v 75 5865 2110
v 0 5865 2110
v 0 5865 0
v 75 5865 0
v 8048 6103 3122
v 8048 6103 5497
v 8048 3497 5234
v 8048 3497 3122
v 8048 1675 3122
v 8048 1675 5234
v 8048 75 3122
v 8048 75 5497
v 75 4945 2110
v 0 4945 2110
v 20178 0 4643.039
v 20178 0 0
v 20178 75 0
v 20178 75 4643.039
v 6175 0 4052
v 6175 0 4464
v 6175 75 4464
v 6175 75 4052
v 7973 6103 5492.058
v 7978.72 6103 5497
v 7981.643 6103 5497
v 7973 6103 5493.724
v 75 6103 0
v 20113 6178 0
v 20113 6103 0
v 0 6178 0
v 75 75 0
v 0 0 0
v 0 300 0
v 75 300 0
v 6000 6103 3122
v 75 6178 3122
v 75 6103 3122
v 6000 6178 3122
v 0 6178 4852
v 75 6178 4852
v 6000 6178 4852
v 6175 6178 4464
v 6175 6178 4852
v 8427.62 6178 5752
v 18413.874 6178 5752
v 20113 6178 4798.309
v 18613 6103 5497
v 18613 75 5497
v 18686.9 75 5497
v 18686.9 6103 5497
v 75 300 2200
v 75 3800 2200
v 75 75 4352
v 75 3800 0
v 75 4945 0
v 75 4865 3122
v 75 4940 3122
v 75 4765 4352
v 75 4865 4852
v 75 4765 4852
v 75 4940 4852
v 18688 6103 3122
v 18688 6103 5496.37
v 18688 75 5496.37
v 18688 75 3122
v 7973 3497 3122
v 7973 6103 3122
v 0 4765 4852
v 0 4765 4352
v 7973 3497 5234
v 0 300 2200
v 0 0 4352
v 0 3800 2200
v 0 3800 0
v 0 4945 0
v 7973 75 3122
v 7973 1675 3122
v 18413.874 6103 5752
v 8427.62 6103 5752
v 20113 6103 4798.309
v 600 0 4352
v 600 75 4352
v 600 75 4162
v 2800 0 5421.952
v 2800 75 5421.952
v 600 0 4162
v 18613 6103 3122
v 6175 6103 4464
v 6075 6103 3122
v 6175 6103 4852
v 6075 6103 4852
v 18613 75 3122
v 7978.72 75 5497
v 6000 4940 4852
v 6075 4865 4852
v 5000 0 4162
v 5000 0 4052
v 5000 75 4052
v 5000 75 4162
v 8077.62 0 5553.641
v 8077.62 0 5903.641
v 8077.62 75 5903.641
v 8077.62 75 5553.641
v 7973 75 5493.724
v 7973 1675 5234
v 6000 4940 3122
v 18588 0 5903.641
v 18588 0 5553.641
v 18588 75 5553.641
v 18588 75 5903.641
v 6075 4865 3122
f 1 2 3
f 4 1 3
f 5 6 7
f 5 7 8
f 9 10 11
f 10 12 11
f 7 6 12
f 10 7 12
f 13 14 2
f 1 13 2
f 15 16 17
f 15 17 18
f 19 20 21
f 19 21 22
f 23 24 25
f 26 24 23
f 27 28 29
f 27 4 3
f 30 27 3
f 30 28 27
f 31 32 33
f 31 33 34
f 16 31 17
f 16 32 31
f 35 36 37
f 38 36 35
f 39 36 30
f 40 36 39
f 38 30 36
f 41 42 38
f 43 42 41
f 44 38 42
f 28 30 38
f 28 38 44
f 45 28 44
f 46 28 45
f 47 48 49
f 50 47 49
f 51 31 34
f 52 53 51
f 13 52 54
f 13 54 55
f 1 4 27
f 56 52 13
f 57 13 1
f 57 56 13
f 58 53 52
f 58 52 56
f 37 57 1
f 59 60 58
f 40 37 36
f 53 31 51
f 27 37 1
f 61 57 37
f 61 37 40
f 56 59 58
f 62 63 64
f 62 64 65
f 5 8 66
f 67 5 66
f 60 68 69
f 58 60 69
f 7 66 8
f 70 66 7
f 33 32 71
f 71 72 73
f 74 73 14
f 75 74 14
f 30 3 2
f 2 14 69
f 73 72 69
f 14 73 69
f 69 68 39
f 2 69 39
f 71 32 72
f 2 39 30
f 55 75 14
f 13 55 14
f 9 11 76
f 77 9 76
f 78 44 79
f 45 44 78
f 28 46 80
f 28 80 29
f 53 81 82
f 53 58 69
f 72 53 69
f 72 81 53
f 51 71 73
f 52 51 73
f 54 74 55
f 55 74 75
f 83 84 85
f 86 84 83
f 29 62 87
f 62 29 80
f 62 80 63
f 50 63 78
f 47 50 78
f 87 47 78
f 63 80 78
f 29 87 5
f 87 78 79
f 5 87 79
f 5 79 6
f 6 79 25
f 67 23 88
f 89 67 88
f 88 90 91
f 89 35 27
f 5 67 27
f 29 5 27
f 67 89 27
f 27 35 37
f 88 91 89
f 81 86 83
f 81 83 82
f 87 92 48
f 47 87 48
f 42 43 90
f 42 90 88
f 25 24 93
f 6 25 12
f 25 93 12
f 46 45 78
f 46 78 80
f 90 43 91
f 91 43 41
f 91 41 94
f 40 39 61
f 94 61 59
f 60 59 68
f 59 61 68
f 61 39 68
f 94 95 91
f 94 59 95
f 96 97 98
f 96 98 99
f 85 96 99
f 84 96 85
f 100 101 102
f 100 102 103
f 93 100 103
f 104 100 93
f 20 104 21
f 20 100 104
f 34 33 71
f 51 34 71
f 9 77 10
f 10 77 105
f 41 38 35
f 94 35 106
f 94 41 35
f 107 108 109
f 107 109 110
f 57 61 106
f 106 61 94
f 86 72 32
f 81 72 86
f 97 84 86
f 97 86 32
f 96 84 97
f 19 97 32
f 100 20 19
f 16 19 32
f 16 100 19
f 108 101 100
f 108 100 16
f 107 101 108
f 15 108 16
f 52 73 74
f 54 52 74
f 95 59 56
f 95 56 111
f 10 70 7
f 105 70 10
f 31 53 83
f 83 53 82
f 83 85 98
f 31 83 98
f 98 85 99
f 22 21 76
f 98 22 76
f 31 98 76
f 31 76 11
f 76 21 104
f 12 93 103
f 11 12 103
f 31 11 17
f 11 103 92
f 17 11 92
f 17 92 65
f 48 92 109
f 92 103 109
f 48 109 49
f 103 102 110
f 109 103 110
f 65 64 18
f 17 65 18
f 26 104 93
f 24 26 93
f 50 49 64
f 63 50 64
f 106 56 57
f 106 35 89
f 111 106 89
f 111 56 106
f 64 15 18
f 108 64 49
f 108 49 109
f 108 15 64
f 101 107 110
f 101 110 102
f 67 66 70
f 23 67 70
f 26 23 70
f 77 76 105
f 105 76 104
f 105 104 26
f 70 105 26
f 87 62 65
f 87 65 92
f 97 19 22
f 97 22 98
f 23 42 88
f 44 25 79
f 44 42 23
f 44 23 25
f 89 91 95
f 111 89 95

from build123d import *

# Parameters (mm, degrees)
F1_DEPTH  = 75
F3_DEPTH  = 75
F5_DEPTH  = 75
F6_W      = 1313
F6_H      = 1730
F7_DEPTH  = 75
F8_W      = 5925
F8_H      = 1730
F9_DEPTH  = 75
F11_DEPTH = 6028
F12_W     = 1822
F12_H     = 2112
F13_DEPTH = 75
F15_DEPTH = 6028


with BuildPart() as f1:
    # F0 (on Right) → F1 (new body)
    with BuildSketch(Plane.YZ):
        Polygon((0, 4352), (0, 0), (300, 0), (300, 2200), (3800, 2200), (3800, 0), (4945, 0), (4945, 2110), (5865, 2110), (5865, 0), (6178, 0), (6178, 4852), (4765, 4852), (4765, 4352), align=None)
    extrude(amount=F1_DEPTH)

    # F2 (on face) → F3 (join)
    with BuildSketch(Plane.XZ):
        Polygon((75, 4352), (75, 0), (20178, 0), (20178, 4643.0391220405), (18588, 5553.6407079484), (18588, 5903.6407079484), (8077.61993, 5903.6407079484), (8077.61993, 5553.6407079484), (6175, 4464), (6175, 4052), (5000, 4052), (5000, 4162), (2800, 5421.9518798725), (600, 4162), (600, 4352), align=None)
    extrude(amount=-F3_DEPTH)

    # F4 (on face) → F5 (join)
    with BuildSketch(Plane(origin=(0, 6178, 0), x_dir=(-1, 0, 0), z_dir=(0, 1, 0))):
        Polygon((-20113, 4798.3090141813), (-20113, 0), (-75, 0), (-75, 3122), (-6075, 3122), (-6075, 4852), (-6175, 4852), (-6175, 4464), (-8427.6199314719, 5752), (-18413.8736724854, 5752), align=None)
    extrude(amount=-F5_DEPTH)

    # F6 (on face) → F7 (join)
    with BuildSketch(Plane(origin=(6075, 0, 0), x_dir=(0, -1, 0), z_dir=(-1, 0, 0))):
        with Locations((-5521.5, 3987)):
            Rectangle(F6_W, F6_H)
    extrude(amount=F7_DEPTH)

    # F8 (on face) → F9 (join)
    with BuildSketch(Plane.XZ.offset(-4865)):
        with Locations((3037.5, 3987)):
            Rectangle(F8_W, F8_H)
    extrude(amount=-F9_DEPTH)

    # F10 (on face) → F11 (join, through all)
    with BuildSketch(Plane(origin=(0, 75, 0), x_dir=(-1, 0, 0), z_dir=(0, 1, 0))):
        Polygon((-8047.99993, 5497), (-8047.99993, 3122), (-7972.99993, 3122), (-7972.99993, 5493.7242690064), (-7978.7196787467, 5497), align=None)
    extrude(amount=F11_DEPTH)

    # F12 (on face) → F13 (cut, through all)
    with BuildSketch(Plane(origin=(7972.99993, 0, 0), x_dir=(0, -1, 0), z_dir=(-1, 0, 0))):
        with Locations((-2586, 4178)):
            Rectangle(F12_W, F12_H)
    extrude(amount=-F13_DEPTH, mode=Mode.SUBTRACT)

    # F14 (on face) → F15 (join, through all)
    with BuildSketch(Plane(origin=(0, 75, 0), x_dir=(-1, 0, 0), z_dir=(0, 1, 0))):
        Polygon((-18688, 5496.3701679542), (-18688, 3122), (-18613, 3122), (-18613, 5497), (-18686.9002512533, 5497), align=None)
    extrude(amount=F15_DEPTH)


solid = f1.part
